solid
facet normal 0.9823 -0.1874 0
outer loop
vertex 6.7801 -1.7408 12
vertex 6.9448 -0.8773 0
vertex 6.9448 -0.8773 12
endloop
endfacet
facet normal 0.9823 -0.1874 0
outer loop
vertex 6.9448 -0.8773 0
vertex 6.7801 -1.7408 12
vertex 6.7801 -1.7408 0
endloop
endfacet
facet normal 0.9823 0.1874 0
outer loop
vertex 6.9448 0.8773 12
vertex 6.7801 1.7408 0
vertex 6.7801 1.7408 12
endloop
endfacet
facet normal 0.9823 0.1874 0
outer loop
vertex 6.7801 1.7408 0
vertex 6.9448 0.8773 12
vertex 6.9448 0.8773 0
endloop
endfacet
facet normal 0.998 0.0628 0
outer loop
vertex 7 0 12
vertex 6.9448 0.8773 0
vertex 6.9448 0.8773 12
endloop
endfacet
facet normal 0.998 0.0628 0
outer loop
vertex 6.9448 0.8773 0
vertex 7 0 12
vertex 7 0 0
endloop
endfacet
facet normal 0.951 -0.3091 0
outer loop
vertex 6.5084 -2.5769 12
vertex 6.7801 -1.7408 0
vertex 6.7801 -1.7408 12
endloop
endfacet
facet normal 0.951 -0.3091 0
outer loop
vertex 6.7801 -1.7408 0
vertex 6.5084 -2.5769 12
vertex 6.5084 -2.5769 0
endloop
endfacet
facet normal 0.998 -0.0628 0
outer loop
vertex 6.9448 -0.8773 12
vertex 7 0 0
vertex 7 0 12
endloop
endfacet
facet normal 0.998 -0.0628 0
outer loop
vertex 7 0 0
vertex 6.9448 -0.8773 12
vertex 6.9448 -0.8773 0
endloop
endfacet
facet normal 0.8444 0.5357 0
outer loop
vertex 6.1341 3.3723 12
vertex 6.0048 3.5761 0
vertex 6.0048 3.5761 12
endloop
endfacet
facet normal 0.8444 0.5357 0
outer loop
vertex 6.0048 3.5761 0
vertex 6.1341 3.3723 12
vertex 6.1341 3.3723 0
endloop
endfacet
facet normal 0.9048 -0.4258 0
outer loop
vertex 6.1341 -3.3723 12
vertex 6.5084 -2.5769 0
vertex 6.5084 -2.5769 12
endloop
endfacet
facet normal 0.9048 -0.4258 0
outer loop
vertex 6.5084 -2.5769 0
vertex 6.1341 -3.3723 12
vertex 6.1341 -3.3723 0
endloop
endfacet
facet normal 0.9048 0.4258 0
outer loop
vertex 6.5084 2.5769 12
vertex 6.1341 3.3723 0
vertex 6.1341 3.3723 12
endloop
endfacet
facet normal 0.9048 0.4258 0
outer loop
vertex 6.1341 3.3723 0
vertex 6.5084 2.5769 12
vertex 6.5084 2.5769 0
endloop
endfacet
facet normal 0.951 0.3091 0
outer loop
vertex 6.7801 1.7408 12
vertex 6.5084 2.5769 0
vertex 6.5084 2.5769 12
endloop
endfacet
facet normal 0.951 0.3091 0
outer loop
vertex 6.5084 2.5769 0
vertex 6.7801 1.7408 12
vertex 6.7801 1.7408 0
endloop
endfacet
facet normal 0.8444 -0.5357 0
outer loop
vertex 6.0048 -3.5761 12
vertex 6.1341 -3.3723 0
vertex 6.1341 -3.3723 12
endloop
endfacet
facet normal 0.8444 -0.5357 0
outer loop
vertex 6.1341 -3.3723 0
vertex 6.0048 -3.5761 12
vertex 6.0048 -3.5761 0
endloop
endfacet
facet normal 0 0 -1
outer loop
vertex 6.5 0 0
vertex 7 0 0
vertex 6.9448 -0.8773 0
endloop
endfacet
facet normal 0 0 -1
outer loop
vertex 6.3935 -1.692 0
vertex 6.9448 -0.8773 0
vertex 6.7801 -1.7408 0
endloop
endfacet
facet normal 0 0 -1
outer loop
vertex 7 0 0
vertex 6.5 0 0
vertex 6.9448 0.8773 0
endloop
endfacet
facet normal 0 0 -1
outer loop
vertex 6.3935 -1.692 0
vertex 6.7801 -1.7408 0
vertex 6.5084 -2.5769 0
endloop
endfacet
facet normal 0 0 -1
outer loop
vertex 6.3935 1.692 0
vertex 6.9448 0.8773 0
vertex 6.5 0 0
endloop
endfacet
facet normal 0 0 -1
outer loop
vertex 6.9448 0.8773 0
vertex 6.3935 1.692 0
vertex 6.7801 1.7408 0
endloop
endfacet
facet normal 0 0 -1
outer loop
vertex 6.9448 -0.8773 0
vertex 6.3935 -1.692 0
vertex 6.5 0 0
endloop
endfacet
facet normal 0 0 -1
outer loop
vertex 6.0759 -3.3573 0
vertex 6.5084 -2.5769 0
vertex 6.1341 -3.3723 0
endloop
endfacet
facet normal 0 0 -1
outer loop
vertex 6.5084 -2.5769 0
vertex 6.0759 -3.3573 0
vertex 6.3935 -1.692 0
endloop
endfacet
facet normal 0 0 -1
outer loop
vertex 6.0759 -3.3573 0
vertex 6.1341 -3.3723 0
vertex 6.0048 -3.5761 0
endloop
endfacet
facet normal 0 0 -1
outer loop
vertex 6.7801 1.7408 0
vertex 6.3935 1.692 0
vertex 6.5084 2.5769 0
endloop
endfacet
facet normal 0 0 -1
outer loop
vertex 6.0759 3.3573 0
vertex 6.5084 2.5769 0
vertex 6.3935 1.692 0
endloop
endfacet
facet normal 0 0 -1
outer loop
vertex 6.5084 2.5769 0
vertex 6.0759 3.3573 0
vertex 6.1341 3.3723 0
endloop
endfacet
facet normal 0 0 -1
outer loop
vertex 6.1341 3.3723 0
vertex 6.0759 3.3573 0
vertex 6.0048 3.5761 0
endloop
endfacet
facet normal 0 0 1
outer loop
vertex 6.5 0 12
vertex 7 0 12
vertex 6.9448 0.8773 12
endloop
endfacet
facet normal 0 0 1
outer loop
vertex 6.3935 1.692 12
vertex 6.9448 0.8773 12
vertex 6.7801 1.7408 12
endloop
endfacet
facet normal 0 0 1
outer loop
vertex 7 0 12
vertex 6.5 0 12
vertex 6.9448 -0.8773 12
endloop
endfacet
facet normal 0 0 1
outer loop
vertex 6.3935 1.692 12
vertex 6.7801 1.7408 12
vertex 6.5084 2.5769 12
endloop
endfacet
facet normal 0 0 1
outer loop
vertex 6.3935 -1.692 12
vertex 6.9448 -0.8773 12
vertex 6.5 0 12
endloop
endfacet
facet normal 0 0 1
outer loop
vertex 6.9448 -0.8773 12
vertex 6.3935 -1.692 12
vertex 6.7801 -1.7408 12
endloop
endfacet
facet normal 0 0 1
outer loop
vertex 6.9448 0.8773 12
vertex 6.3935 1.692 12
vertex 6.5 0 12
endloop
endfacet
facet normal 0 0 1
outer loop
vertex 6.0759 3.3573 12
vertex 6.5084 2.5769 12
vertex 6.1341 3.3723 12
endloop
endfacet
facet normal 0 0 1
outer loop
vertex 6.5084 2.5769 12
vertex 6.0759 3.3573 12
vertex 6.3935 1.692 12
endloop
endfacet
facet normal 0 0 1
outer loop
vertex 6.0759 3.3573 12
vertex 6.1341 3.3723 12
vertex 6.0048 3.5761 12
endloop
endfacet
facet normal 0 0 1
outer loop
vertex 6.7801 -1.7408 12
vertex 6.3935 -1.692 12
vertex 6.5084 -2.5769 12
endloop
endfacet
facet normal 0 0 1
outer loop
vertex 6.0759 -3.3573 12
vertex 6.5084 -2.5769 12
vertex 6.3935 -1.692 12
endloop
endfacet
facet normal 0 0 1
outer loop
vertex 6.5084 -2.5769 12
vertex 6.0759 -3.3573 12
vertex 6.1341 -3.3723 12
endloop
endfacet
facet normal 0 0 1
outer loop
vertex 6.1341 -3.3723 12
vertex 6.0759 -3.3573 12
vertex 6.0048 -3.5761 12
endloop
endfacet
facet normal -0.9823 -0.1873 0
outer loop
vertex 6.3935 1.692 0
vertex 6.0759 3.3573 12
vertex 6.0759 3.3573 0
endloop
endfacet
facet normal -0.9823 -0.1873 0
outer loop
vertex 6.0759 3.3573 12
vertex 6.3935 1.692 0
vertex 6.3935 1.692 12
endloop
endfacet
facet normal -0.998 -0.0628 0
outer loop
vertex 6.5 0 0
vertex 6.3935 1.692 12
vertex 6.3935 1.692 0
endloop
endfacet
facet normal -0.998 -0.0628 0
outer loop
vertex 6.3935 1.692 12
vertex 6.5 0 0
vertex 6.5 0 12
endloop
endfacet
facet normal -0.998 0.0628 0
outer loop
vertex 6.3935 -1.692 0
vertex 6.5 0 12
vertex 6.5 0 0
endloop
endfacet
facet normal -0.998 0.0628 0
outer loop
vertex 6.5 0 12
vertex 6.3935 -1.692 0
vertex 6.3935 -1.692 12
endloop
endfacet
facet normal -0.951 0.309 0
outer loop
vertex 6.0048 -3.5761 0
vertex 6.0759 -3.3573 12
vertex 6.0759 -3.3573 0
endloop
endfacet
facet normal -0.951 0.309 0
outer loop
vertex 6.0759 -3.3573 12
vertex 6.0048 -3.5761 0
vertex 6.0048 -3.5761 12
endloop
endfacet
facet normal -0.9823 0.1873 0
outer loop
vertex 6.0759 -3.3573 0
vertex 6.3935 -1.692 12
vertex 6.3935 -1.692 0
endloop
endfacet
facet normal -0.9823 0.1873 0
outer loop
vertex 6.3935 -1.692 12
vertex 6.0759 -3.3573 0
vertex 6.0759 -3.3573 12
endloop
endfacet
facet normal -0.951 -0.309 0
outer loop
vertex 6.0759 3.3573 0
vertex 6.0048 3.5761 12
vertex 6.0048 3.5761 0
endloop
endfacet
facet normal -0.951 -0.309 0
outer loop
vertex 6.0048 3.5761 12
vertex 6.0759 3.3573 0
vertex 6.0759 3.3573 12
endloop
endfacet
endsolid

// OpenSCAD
$fn = 50;


difference() {
	union() {
		cylinder(h = 12, r = 7.0000000000);
		translate(v = [-10.0000000000, 0, 0]) {
			cylinder(h = 12, r = 7.0000000000);
		}
	}
	union() {
		cylinder(h = 12, r = 3.2500000000);
		cylinder(h = 12, r = 1.8000000000);
		cylinder(h = 12, r = 1.8000000000);
		cylinder(h = 12, r = 1.8000000000);
		translate(v = [-14.5000000000, 0, 0]) {
			hull() {
				translate(v = [-3.7500000000, 0.0000000000, 0]) {
					cylinder(h = 12, r = 7.5000000000);
				}
				translate(v = [3.7500000000, 0.0000000000, 0]) {
					cylinder(h = 12, r = 7.5000000000);
				}
				translate(v = [-3.7500000000, -0.0000000000, 0]) {
					cylinder(h = 12, r = 7.5000000000);
				}
				translate(v = [3.7500000000, -0.0000000000, 0]) {
					cylinder(h = 12, r = 7.5000000000);
				}
			}
		}
		translate(v = [-7.0000000000, 0, 0.0000000000]) {
			cylinder(h = 12, r = 13.5000000000);
		}
	}
}
